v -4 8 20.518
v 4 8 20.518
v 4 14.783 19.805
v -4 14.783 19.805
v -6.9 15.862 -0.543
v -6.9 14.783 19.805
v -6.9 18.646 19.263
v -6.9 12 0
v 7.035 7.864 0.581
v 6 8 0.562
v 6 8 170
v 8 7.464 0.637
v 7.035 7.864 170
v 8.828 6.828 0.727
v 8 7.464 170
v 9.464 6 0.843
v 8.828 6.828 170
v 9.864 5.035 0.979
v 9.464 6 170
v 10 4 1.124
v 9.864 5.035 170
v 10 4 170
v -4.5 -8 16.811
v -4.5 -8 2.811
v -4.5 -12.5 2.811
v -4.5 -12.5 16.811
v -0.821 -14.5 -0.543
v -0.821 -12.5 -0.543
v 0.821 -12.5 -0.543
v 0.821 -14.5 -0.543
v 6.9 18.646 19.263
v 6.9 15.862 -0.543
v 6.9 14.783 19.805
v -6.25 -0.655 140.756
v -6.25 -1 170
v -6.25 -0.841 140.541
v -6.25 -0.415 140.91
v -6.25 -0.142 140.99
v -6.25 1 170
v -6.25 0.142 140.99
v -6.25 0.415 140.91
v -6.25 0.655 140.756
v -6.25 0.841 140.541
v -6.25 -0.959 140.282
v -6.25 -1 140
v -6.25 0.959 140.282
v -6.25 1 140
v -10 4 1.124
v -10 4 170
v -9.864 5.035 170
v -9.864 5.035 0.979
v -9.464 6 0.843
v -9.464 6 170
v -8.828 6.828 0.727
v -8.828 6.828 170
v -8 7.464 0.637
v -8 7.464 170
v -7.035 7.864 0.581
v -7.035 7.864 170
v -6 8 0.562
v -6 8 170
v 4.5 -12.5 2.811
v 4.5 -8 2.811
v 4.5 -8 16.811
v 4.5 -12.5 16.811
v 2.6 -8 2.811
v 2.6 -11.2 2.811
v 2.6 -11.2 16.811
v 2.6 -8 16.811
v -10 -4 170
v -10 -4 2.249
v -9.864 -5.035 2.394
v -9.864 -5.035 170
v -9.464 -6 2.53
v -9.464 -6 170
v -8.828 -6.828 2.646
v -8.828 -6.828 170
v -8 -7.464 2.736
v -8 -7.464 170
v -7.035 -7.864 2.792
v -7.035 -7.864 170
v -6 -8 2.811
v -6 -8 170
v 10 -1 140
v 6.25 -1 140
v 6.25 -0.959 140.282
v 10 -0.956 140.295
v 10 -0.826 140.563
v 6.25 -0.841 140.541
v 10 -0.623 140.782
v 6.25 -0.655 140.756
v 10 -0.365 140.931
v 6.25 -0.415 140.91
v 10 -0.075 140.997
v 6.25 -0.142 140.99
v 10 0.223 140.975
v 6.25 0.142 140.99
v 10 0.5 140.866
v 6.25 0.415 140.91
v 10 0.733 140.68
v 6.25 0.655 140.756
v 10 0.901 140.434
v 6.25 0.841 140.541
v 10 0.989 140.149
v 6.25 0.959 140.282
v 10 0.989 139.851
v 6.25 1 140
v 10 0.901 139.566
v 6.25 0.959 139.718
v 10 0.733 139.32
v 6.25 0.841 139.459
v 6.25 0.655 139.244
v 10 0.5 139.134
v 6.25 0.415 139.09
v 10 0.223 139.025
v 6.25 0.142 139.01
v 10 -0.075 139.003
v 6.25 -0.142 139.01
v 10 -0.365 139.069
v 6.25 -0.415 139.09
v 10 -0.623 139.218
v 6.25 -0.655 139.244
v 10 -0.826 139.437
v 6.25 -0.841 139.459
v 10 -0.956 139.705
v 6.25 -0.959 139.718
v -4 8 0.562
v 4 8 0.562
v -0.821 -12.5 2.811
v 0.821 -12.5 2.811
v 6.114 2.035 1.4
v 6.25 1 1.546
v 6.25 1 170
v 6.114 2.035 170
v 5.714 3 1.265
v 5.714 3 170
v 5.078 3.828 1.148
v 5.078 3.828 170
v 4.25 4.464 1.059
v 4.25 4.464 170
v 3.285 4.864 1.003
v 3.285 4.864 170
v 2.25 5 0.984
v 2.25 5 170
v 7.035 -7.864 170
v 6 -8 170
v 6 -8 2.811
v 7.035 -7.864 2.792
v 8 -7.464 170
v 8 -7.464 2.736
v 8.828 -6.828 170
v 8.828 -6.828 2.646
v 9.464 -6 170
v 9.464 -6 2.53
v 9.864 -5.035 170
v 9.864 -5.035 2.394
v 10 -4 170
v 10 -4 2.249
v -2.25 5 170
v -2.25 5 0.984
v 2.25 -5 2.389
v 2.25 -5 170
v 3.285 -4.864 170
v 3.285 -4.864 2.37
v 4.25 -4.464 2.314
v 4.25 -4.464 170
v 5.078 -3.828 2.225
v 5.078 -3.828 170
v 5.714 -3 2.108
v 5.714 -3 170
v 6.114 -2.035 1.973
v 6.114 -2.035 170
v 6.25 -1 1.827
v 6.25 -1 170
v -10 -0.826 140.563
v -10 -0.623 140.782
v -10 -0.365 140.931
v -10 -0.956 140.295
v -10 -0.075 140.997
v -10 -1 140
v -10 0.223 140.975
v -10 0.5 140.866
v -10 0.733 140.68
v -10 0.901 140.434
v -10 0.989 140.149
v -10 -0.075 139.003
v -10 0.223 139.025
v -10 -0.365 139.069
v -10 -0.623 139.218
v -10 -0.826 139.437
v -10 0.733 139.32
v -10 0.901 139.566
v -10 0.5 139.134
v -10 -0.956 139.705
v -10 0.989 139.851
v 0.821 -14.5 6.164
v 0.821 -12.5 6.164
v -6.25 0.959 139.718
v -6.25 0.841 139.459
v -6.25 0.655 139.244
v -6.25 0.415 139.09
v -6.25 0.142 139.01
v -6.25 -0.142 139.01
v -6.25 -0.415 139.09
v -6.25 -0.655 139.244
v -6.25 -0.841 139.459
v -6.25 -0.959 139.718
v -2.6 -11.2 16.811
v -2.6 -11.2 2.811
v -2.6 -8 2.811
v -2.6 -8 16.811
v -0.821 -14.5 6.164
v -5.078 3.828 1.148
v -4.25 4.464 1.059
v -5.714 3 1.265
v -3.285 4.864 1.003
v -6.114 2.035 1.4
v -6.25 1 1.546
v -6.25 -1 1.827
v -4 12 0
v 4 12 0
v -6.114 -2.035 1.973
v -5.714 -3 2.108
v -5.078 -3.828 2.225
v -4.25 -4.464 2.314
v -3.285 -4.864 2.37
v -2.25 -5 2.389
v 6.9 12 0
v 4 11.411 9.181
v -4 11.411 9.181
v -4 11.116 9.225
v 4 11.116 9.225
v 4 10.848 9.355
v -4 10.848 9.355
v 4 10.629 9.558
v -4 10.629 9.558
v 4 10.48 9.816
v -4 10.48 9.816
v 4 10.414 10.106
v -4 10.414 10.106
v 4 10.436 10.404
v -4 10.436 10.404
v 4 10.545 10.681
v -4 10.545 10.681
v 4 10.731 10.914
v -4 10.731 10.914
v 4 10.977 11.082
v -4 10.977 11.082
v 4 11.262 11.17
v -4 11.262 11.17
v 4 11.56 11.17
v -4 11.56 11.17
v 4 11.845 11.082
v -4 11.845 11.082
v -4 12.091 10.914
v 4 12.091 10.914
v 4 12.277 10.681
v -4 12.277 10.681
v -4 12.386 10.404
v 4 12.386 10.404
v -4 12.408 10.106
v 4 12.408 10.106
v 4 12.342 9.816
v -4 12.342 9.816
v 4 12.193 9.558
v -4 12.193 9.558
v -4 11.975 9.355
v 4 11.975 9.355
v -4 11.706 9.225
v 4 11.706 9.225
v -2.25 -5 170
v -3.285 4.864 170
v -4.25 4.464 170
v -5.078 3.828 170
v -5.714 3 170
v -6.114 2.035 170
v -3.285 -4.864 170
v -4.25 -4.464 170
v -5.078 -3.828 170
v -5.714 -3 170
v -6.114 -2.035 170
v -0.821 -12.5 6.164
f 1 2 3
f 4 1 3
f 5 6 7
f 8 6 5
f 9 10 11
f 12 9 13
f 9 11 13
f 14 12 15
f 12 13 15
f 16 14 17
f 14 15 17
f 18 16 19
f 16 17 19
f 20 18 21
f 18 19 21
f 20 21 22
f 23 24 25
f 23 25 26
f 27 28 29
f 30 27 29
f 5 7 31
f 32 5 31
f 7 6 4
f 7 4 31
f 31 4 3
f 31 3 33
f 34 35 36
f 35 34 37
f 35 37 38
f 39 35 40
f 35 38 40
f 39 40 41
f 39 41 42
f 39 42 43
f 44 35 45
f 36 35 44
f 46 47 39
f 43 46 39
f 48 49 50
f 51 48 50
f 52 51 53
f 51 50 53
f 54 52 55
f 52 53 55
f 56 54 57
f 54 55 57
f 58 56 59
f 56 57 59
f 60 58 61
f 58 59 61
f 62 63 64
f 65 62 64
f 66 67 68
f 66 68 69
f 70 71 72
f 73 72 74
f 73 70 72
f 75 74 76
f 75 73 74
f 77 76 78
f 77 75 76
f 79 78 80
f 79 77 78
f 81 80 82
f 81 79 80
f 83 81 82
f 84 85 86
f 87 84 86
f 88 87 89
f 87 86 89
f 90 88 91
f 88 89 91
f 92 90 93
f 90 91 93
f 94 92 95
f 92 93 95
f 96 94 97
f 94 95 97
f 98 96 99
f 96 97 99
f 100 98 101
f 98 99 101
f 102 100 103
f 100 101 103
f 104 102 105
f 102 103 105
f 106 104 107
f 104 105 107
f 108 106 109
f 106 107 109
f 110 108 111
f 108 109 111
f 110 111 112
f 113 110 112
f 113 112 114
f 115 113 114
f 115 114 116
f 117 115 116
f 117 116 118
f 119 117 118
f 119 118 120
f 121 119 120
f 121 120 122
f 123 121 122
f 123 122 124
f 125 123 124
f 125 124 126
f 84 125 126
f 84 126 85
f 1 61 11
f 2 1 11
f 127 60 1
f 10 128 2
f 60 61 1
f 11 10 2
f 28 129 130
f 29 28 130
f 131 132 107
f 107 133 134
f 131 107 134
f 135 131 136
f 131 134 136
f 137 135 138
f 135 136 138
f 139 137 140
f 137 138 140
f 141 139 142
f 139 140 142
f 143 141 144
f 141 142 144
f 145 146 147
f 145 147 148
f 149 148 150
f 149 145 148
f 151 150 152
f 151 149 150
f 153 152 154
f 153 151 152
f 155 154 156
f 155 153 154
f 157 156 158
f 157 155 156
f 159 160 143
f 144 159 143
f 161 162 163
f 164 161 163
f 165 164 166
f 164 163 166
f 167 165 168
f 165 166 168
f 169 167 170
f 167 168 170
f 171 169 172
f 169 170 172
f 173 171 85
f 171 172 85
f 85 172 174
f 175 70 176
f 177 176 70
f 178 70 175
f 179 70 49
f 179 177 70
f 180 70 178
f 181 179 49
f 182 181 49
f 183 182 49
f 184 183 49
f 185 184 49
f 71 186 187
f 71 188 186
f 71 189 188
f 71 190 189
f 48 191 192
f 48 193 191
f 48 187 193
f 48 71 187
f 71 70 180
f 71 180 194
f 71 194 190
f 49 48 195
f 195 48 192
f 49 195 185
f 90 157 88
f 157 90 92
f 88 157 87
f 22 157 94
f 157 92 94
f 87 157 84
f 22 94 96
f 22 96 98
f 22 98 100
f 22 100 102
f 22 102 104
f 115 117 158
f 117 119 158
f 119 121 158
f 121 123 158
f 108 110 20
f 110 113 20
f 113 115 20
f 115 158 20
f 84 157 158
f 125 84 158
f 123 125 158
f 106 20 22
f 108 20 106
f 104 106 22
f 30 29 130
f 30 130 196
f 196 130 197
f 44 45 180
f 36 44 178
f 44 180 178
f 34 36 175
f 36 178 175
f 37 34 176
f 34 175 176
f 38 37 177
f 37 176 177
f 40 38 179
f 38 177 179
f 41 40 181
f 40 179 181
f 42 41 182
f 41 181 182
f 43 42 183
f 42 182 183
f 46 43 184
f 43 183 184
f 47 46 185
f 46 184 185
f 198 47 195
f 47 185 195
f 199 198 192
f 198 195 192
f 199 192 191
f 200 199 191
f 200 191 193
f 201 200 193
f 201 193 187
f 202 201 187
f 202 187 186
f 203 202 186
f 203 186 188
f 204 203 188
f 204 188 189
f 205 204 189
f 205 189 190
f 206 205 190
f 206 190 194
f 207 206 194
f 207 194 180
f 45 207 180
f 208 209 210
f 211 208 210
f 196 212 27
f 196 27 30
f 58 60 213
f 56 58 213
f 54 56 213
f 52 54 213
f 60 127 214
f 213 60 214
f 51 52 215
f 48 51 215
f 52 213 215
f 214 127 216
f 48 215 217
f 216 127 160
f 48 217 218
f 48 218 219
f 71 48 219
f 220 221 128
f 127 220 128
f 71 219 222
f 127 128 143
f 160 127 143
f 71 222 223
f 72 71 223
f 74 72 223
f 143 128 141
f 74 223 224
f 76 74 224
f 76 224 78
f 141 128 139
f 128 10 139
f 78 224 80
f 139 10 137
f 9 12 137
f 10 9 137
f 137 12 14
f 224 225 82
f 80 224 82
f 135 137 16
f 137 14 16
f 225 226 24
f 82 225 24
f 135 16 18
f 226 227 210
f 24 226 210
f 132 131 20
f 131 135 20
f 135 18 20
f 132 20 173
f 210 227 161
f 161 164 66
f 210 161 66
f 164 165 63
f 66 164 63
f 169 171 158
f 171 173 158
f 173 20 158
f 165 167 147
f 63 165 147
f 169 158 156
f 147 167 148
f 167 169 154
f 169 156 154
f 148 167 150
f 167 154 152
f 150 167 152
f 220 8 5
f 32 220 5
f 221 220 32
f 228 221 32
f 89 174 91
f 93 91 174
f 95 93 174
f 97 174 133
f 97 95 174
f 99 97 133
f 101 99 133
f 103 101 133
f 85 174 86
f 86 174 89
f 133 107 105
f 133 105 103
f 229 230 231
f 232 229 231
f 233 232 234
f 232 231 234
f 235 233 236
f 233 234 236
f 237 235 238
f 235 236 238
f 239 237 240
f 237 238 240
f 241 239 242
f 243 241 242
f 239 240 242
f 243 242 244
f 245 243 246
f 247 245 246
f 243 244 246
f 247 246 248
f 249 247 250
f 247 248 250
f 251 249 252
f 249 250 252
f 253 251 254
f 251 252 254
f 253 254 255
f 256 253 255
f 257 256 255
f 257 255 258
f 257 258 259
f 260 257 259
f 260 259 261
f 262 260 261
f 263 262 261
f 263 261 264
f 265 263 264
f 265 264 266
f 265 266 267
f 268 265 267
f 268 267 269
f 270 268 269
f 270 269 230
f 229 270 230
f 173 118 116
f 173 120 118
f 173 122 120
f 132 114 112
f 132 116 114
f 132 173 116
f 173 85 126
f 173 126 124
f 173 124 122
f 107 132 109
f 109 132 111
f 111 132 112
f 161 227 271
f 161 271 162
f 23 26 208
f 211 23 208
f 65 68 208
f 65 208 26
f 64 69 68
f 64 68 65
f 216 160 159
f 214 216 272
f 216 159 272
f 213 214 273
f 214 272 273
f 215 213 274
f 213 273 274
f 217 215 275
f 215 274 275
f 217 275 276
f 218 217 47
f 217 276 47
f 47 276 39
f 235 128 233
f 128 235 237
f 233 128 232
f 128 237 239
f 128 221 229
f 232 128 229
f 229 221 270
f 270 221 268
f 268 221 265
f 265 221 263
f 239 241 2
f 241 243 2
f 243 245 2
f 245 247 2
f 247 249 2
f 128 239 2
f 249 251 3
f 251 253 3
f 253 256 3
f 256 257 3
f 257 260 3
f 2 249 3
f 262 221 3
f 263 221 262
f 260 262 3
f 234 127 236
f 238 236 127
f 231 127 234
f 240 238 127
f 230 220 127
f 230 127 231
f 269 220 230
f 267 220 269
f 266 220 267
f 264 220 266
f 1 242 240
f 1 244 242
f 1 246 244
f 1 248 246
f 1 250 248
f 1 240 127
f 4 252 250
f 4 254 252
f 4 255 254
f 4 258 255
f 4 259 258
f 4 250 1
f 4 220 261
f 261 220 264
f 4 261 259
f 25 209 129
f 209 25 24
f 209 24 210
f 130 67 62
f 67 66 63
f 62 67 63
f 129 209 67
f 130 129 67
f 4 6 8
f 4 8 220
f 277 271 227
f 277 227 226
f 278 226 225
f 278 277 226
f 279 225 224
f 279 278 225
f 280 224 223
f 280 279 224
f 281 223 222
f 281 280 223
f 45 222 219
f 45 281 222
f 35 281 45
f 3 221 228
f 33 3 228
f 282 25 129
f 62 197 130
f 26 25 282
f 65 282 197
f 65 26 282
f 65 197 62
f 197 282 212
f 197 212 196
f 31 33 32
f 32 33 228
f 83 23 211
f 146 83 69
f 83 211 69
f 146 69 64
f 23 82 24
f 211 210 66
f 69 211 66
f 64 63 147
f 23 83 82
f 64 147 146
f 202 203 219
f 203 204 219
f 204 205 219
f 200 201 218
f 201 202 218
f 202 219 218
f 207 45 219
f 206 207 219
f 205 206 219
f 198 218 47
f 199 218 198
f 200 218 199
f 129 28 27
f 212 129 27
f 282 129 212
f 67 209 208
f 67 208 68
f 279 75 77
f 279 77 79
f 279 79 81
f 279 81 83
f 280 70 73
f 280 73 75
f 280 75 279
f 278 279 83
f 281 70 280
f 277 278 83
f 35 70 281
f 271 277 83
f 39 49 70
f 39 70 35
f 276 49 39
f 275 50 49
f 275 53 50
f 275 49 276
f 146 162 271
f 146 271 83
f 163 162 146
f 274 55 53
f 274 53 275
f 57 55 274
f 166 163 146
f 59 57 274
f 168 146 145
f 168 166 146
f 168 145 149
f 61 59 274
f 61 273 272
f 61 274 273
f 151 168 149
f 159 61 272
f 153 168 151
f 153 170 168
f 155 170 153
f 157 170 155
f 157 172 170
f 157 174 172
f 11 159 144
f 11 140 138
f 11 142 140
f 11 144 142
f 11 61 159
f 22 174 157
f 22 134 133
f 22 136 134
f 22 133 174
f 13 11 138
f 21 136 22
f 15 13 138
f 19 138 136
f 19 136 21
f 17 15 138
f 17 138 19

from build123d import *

# Parameters (mm, degrees)
SKETCH1_W                = 20
SKETCH1_H                = 16
SKETCH1_W_2              = 12.5
SKETCH1_H_2              = 10
BOSS_EXTRUDE1_DEPTH      = 170
FILLET1_R                = 4
FILLET2_R                = 4
SKETCH5_R                = 1
CUT_EXTRUDE2_DEPTH       = 21
BOSS_EXTRUDE2_DEPTH      = 4
BOSS_EXTRUDE2_DEPTH_BACK = 4
SKETCH7_W                = 13.8
SKETCH7_H                = 20
BOSS_EXTRUDE3_DEPTH      = 3.9
SKETCH8_R                = 1
CUT_EXTRUDE3_DEPTH       = 17.9
CUT_EXTRUDE4_DEPTH       = 21
SKETCH10_W               = 9
SKETCH10_H               = 14
BOSS_EXTRUDE4_DEPTH      = 4.5
SKETCH11_W               = 5.2
SKETCH11_H               = 3.2
CUT_EXTRUDE5_DEPTH       = 18.353591788
SKETCH12_W               = 1.641339812
SKETCH12_H               = 6.707183576
BOSS_EXTRUDE5_DEPTH      = 2


with BuildPart() as part:
    # Sketch1 → Boss-Extrude1 (new body)
    with BuildSketch(Plane.XY):
        Rectangle(SKETCH1_W, SKETCH1_H)
        Rectangle(SKETCH1_W_2, SKETCH1_H_2, mode=Mode.SUBTRACT)
    extrude(amount=BOSS_EXTRUDE1_DEPTH)

    # Fillet1
    fillet1_edges = [part.edges().sort_by_distance(p)[0] for p in [
        (10, -8, 85),
        (-10, -8, 85),
        (-10, 8, 85),
        (10, 8, 85),
    ]]
    fillet(fillet1_edges, radius=FILLET1_R)

    # Fillet2
    fillet2_edges = [part.edges().sort_by_distance(p)[0] for p in [
        (-6.25, 5, 85),
        (-6.25, -5, 85),
        (6.25, -5, 85),
        (6.25, 5, 85),
    ]]
    fillet(fillet2_edges, radius=FILLET2_R)

    # Sketch5 → Cut-Extrude2 (cut, through all)
    with BuildSketch(Plane.ZY.offset(10)):
        with Locations(Location((140, 0, 0), (0, 0, 270))):  # turned: the seam where the file's is
            Circle(SKETCH5_R)
    extrude(amount=-CUT_EXTRUDE2_DEPTH, mode=Mode.SUBTRACT)

    # Sketch6 → Boss-Extrude2 (add, two sides)
    with BuildSketch(Plane(origin=(0, 0, 0), x_dir=(0, 0, -1), z_dir=(1, 0, 0))) as boss_extrude2_sk:
        Polygon((0, 8), (-20.518331963, 8), (-19.805361375, 14.783462019), (0, 12), align=None)
    extrude(amount=BOSS_EXTRUDE2_DEPTH)
    extrude(boss_extrude2_sk.sketch, amount=-BOSS_EXTRUDE2_DEPTH_BACK)

    # Sketch7 → Boss-Extrude3 (add)
    with BuildSketch(Plane(origin=(0, 11.767570176, -1.653824135), x_dir=(1, 0, 0), z_dir=(0, 0.990268069, -0.139173101))):
        with Locations((0, -11.670077212)):
            Rectangle(SKETCH7_W, SKETCH7_H)
    extrude(amount=BOSS_EXTRUDE3_DEPTH)

    # Sketch8 → Cut-Extrude3 (cut, through all)
    with BuildSketch(Plane.ZY.offset(6.9)):
        with Locations(Location((10.181026889, 11.411194872, 0), (0, 0, 180))):  # turned: the seam where the file's is
            Circle(SKETCH8_R)
    extrude(amount=-CUT_EXTRUDE3_DEPTH, mode=Mode.SUBTRACT)

    # Sketch9 → Cut-Extrude4 (cut, through all)
    with BuildSketch(Plane(origin=(10, 0, 0), x_dir=(0, 0, -1), z_dir=(1, 0, 0))):
        Polygon((0.542775094, 15.862045468), (-3.375840567, -12.020353756), (9.67259421, -8.835863415), (6.237624145, 16.663737896), align=None)
    extrude(amount=-CUT_EXTRUDE4_DEPTH, mode=Mode.SUBTRACT)

    # Sketch10 → Boss-Extrude4 (add)
    with BuildSketch(Plane.XZ.offset(8)):
        with Locations((0, 9.810816694)):
            Rectangle(SKETCH10_W, SKETCH10_H)
    extrude(amount=BOSS_EXTRUDE4_DEPTH)

    # Sketch11 → Cut-Extrude5 (cut, through all)
    with BuildSketch(Plane.XY.offset(16.810816694)):
        with Locations((0, -9.6)):
            Rectangle(SKETCH11_W, SKETCH11_H)
    extrude(amount=-CUT_EXTRUDE5_DEPTH, mode=Mode.SUBTRACT)

    # Sketch12 → Boss-Extrude5 (add)
    with BuildSketch(Plane.XZ.offset(12.5)):
        with Locations((0, 2.810816694)):
            Rectangle(SKETCH12_W, SKETCH12_H)
    extrude(amount=BOSS_EXTRUDE5_DEPTH)


solid = part.part
